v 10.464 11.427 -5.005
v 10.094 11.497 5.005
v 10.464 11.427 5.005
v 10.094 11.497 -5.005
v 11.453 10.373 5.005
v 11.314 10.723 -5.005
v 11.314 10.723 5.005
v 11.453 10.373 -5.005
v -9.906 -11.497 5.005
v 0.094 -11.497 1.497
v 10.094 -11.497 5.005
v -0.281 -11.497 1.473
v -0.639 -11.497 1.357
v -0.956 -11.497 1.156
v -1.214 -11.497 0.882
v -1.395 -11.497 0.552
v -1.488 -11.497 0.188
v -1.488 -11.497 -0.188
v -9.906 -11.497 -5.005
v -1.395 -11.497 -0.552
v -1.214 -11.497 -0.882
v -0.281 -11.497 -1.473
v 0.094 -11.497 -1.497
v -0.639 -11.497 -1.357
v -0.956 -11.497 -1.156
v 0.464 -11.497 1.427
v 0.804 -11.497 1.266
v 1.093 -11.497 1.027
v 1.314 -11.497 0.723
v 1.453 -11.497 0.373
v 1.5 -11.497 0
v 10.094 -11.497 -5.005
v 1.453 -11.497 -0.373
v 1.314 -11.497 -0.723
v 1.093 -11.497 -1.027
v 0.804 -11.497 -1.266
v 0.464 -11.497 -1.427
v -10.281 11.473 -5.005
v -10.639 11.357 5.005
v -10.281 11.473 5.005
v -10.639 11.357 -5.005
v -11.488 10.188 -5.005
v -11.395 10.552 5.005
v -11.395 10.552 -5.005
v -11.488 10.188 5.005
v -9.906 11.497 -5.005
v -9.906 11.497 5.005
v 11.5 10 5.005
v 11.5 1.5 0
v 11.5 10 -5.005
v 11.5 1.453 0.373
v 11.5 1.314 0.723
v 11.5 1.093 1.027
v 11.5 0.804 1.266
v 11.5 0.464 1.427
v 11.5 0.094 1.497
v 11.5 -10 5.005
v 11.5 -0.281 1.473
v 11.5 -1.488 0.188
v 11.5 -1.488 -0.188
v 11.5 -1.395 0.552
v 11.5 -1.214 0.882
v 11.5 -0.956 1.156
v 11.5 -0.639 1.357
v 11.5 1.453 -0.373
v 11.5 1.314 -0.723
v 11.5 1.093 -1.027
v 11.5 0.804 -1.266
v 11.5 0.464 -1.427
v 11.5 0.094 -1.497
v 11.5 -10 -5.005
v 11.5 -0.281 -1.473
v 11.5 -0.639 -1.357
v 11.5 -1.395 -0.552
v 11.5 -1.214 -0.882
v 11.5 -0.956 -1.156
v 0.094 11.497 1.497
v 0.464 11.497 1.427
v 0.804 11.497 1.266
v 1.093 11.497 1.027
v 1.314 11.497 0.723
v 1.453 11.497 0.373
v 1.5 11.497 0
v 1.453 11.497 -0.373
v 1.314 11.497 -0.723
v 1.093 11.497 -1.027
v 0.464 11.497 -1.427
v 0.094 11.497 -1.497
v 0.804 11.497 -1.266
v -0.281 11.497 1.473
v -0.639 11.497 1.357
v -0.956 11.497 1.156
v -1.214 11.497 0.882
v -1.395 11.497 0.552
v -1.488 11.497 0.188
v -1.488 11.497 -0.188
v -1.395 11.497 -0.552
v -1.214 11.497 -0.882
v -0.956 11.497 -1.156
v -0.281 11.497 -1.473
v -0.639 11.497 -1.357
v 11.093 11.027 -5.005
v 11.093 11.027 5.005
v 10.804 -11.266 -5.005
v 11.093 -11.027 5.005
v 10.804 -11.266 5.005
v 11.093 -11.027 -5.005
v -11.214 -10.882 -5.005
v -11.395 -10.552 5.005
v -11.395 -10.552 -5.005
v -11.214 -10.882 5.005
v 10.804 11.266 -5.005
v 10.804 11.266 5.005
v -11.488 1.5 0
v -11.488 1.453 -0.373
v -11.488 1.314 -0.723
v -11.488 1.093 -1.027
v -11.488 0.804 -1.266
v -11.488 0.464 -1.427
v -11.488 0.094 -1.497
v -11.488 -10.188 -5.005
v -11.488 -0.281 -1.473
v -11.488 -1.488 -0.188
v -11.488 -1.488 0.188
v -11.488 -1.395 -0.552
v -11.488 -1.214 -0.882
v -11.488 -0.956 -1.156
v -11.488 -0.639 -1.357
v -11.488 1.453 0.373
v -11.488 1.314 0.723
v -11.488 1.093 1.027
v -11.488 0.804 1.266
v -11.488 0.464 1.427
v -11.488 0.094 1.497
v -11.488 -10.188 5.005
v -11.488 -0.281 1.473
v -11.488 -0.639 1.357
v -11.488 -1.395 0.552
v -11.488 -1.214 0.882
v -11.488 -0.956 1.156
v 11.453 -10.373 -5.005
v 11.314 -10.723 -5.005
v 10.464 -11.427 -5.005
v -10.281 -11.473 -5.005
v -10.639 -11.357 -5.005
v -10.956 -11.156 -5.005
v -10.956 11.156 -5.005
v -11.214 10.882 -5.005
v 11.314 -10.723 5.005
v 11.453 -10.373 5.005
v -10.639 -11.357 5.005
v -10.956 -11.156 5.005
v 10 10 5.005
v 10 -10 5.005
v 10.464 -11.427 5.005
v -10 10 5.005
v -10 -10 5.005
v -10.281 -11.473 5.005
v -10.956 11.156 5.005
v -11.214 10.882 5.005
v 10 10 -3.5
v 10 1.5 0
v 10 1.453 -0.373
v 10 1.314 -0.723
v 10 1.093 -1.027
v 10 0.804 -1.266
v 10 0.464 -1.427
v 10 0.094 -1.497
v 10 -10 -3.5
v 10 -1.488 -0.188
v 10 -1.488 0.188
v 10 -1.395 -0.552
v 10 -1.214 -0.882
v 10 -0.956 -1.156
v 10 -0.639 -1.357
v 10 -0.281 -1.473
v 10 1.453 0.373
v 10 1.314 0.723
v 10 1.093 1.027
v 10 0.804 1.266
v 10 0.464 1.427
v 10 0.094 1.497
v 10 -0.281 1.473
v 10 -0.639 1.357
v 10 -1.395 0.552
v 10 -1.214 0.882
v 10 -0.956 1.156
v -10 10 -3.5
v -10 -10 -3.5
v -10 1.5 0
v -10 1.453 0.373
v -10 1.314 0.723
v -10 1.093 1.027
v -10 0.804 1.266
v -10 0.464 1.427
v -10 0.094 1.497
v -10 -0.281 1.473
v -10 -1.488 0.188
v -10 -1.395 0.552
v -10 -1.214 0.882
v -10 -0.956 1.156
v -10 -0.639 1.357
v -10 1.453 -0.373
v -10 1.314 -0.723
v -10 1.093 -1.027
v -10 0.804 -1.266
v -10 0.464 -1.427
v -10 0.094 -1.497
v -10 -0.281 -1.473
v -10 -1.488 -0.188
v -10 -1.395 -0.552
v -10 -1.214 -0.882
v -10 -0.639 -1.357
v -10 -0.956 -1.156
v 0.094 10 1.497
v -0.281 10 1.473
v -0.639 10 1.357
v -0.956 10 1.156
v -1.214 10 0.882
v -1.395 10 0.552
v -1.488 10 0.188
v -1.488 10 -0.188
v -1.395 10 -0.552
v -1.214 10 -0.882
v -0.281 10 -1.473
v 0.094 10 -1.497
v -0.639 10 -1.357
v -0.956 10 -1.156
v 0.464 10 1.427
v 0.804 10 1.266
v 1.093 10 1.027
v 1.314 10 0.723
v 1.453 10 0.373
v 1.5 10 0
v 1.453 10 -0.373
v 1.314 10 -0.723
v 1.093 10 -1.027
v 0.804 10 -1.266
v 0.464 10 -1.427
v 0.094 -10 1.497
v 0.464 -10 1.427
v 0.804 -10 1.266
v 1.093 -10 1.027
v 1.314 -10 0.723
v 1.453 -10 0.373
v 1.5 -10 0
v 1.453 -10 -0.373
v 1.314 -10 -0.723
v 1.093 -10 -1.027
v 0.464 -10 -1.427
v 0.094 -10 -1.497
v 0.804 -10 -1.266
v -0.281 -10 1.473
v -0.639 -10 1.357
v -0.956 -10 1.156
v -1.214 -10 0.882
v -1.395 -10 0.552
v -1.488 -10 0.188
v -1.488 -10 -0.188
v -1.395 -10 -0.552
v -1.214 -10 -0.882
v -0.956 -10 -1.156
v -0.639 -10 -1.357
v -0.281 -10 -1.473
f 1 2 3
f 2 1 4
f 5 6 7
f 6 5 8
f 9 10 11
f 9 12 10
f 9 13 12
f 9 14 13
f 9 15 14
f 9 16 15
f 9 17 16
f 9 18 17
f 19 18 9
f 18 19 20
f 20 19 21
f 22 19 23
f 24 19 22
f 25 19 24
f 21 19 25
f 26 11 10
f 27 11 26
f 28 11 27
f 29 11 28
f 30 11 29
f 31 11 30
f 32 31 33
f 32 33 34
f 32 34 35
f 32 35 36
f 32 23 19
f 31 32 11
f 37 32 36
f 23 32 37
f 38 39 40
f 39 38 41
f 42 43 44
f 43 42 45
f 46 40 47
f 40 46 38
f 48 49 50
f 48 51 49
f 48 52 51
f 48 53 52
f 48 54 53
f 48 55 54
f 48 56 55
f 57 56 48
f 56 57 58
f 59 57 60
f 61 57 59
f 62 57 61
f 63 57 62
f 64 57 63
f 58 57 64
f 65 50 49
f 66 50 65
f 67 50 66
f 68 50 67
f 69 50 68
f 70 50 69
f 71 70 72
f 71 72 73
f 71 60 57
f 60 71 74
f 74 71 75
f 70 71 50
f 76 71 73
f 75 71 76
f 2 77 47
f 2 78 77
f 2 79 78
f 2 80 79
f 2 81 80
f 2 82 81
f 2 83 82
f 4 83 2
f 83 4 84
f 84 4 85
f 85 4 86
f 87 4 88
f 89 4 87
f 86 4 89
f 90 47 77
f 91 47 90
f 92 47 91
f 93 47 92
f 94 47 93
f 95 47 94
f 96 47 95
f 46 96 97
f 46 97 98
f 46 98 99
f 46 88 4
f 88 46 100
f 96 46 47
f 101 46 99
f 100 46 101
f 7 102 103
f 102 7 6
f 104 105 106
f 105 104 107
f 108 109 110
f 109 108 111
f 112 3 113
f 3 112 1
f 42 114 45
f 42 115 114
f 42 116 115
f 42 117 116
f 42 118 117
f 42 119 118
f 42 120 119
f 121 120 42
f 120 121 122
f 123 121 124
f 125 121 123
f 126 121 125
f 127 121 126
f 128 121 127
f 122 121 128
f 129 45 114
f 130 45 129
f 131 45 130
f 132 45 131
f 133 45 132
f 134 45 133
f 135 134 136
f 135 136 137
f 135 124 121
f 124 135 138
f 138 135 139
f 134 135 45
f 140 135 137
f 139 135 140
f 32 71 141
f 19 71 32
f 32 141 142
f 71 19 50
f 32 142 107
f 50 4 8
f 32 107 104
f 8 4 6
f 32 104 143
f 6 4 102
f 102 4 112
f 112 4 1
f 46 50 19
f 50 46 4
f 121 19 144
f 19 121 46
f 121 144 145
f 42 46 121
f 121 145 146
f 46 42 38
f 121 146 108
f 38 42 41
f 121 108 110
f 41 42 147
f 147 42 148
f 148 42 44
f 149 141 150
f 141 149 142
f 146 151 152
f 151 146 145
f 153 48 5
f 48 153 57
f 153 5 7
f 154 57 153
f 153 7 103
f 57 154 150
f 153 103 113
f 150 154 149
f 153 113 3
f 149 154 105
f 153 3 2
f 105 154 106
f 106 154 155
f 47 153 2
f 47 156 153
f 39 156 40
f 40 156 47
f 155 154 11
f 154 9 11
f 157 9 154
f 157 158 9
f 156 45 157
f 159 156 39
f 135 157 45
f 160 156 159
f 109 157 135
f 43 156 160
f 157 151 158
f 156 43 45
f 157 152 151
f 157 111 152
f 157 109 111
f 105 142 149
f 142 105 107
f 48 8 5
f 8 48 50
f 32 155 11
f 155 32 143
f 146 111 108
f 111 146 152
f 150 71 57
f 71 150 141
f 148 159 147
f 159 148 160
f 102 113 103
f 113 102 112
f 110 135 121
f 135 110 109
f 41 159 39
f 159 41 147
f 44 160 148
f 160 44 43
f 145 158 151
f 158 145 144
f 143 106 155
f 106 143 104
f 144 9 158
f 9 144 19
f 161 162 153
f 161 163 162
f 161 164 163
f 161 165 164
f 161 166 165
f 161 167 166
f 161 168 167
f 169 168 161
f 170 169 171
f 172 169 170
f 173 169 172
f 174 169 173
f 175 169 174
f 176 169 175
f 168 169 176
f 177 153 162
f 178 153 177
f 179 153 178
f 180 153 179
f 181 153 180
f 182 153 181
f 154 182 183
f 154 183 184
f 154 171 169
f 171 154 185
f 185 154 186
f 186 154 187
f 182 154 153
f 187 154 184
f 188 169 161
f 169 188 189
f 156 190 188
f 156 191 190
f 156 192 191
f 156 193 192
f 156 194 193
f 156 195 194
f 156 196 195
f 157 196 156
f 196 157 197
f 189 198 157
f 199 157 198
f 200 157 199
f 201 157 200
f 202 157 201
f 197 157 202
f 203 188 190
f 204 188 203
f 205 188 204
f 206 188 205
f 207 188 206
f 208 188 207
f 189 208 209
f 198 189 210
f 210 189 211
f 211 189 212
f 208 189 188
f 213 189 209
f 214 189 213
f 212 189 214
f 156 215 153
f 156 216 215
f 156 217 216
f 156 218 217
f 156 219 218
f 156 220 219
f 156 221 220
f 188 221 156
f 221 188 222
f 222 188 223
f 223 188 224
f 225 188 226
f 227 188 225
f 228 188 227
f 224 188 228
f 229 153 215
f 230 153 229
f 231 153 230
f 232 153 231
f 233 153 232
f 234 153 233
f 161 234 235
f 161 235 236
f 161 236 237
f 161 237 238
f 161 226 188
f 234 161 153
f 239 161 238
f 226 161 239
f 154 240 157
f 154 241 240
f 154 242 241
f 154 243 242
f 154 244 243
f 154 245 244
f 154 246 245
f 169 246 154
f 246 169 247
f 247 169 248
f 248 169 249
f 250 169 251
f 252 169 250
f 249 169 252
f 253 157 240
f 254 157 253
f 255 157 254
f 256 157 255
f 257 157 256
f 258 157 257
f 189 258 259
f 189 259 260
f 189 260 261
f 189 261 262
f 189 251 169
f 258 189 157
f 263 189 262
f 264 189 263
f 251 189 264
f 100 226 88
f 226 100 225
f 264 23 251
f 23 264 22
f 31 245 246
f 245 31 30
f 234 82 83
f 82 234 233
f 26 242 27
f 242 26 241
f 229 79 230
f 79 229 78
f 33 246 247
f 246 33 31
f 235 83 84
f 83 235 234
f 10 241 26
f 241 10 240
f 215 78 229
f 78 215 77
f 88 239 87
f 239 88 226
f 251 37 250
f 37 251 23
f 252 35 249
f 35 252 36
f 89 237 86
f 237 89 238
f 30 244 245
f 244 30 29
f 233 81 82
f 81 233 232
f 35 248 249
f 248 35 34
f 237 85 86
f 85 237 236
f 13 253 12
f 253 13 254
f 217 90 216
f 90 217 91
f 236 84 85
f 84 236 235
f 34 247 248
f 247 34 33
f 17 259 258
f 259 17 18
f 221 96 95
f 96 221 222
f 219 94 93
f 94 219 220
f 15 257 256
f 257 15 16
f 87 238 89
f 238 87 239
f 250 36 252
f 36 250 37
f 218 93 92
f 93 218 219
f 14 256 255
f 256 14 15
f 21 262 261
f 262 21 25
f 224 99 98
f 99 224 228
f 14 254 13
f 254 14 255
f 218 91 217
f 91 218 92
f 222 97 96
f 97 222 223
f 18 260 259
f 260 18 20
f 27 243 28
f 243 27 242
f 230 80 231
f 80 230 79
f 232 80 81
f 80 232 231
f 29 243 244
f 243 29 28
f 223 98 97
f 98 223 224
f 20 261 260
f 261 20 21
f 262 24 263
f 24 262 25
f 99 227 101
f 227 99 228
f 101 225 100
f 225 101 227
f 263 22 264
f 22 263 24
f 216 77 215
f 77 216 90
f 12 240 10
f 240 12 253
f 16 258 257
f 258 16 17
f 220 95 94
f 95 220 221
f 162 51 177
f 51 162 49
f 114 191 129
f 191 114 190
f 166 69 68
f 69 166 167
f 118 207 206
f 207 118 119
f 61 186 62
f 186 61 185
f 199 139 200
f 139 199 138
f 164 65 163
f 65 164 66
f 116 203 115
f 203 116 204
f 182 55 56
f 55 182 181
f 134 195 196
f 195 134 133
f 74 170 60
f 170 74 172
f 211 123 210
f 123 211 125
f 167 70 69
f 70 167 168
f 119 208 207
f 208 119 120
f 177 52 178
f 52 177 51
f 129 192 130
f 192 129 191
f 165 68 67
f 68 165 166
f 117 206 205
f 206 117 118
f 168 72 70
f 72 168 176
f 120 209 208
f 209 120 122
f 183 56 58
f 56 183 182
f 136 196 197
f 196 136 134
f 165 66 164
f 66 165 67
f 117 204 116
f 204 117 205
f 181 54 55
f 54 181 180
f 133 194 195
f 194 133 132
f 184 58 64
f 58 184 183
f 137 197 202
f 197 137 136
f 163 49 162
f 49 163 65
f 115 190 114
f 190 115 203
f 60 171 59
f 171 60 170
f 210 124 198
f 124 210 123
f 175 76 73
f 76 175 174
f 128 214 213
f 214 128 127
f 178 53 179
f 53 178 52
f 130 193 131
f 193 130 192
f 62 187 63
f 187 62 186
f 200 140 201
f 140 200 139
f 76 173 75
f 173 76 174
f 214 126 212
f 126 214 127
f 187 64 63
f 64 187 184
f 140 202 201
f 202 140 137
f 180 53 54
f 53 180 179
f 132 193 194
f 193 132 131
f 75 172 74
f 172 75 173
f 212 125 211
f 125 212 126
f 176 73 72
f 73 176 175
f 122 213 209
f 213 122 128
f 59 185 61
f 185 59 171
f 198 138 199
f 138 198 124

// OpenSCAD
$fn=25;

module part2()
{
	difference() {

		minkowski(){
			cube([20,20,10], center=true);
			cylinder(r=1.5,h=0.01, center=true);
		}
		translate([0,0,1.5]) cube([20,20,10], center=true);
		rotate(90, [1,0,0]) cylinder(r=1.5, h=23, center=true);
		rotate(90, [1,0,0]) rotate(90, [0,1,0]) cylinder(r=1.5, h=23, center=true);
	}
	
	
	
}

part2();
